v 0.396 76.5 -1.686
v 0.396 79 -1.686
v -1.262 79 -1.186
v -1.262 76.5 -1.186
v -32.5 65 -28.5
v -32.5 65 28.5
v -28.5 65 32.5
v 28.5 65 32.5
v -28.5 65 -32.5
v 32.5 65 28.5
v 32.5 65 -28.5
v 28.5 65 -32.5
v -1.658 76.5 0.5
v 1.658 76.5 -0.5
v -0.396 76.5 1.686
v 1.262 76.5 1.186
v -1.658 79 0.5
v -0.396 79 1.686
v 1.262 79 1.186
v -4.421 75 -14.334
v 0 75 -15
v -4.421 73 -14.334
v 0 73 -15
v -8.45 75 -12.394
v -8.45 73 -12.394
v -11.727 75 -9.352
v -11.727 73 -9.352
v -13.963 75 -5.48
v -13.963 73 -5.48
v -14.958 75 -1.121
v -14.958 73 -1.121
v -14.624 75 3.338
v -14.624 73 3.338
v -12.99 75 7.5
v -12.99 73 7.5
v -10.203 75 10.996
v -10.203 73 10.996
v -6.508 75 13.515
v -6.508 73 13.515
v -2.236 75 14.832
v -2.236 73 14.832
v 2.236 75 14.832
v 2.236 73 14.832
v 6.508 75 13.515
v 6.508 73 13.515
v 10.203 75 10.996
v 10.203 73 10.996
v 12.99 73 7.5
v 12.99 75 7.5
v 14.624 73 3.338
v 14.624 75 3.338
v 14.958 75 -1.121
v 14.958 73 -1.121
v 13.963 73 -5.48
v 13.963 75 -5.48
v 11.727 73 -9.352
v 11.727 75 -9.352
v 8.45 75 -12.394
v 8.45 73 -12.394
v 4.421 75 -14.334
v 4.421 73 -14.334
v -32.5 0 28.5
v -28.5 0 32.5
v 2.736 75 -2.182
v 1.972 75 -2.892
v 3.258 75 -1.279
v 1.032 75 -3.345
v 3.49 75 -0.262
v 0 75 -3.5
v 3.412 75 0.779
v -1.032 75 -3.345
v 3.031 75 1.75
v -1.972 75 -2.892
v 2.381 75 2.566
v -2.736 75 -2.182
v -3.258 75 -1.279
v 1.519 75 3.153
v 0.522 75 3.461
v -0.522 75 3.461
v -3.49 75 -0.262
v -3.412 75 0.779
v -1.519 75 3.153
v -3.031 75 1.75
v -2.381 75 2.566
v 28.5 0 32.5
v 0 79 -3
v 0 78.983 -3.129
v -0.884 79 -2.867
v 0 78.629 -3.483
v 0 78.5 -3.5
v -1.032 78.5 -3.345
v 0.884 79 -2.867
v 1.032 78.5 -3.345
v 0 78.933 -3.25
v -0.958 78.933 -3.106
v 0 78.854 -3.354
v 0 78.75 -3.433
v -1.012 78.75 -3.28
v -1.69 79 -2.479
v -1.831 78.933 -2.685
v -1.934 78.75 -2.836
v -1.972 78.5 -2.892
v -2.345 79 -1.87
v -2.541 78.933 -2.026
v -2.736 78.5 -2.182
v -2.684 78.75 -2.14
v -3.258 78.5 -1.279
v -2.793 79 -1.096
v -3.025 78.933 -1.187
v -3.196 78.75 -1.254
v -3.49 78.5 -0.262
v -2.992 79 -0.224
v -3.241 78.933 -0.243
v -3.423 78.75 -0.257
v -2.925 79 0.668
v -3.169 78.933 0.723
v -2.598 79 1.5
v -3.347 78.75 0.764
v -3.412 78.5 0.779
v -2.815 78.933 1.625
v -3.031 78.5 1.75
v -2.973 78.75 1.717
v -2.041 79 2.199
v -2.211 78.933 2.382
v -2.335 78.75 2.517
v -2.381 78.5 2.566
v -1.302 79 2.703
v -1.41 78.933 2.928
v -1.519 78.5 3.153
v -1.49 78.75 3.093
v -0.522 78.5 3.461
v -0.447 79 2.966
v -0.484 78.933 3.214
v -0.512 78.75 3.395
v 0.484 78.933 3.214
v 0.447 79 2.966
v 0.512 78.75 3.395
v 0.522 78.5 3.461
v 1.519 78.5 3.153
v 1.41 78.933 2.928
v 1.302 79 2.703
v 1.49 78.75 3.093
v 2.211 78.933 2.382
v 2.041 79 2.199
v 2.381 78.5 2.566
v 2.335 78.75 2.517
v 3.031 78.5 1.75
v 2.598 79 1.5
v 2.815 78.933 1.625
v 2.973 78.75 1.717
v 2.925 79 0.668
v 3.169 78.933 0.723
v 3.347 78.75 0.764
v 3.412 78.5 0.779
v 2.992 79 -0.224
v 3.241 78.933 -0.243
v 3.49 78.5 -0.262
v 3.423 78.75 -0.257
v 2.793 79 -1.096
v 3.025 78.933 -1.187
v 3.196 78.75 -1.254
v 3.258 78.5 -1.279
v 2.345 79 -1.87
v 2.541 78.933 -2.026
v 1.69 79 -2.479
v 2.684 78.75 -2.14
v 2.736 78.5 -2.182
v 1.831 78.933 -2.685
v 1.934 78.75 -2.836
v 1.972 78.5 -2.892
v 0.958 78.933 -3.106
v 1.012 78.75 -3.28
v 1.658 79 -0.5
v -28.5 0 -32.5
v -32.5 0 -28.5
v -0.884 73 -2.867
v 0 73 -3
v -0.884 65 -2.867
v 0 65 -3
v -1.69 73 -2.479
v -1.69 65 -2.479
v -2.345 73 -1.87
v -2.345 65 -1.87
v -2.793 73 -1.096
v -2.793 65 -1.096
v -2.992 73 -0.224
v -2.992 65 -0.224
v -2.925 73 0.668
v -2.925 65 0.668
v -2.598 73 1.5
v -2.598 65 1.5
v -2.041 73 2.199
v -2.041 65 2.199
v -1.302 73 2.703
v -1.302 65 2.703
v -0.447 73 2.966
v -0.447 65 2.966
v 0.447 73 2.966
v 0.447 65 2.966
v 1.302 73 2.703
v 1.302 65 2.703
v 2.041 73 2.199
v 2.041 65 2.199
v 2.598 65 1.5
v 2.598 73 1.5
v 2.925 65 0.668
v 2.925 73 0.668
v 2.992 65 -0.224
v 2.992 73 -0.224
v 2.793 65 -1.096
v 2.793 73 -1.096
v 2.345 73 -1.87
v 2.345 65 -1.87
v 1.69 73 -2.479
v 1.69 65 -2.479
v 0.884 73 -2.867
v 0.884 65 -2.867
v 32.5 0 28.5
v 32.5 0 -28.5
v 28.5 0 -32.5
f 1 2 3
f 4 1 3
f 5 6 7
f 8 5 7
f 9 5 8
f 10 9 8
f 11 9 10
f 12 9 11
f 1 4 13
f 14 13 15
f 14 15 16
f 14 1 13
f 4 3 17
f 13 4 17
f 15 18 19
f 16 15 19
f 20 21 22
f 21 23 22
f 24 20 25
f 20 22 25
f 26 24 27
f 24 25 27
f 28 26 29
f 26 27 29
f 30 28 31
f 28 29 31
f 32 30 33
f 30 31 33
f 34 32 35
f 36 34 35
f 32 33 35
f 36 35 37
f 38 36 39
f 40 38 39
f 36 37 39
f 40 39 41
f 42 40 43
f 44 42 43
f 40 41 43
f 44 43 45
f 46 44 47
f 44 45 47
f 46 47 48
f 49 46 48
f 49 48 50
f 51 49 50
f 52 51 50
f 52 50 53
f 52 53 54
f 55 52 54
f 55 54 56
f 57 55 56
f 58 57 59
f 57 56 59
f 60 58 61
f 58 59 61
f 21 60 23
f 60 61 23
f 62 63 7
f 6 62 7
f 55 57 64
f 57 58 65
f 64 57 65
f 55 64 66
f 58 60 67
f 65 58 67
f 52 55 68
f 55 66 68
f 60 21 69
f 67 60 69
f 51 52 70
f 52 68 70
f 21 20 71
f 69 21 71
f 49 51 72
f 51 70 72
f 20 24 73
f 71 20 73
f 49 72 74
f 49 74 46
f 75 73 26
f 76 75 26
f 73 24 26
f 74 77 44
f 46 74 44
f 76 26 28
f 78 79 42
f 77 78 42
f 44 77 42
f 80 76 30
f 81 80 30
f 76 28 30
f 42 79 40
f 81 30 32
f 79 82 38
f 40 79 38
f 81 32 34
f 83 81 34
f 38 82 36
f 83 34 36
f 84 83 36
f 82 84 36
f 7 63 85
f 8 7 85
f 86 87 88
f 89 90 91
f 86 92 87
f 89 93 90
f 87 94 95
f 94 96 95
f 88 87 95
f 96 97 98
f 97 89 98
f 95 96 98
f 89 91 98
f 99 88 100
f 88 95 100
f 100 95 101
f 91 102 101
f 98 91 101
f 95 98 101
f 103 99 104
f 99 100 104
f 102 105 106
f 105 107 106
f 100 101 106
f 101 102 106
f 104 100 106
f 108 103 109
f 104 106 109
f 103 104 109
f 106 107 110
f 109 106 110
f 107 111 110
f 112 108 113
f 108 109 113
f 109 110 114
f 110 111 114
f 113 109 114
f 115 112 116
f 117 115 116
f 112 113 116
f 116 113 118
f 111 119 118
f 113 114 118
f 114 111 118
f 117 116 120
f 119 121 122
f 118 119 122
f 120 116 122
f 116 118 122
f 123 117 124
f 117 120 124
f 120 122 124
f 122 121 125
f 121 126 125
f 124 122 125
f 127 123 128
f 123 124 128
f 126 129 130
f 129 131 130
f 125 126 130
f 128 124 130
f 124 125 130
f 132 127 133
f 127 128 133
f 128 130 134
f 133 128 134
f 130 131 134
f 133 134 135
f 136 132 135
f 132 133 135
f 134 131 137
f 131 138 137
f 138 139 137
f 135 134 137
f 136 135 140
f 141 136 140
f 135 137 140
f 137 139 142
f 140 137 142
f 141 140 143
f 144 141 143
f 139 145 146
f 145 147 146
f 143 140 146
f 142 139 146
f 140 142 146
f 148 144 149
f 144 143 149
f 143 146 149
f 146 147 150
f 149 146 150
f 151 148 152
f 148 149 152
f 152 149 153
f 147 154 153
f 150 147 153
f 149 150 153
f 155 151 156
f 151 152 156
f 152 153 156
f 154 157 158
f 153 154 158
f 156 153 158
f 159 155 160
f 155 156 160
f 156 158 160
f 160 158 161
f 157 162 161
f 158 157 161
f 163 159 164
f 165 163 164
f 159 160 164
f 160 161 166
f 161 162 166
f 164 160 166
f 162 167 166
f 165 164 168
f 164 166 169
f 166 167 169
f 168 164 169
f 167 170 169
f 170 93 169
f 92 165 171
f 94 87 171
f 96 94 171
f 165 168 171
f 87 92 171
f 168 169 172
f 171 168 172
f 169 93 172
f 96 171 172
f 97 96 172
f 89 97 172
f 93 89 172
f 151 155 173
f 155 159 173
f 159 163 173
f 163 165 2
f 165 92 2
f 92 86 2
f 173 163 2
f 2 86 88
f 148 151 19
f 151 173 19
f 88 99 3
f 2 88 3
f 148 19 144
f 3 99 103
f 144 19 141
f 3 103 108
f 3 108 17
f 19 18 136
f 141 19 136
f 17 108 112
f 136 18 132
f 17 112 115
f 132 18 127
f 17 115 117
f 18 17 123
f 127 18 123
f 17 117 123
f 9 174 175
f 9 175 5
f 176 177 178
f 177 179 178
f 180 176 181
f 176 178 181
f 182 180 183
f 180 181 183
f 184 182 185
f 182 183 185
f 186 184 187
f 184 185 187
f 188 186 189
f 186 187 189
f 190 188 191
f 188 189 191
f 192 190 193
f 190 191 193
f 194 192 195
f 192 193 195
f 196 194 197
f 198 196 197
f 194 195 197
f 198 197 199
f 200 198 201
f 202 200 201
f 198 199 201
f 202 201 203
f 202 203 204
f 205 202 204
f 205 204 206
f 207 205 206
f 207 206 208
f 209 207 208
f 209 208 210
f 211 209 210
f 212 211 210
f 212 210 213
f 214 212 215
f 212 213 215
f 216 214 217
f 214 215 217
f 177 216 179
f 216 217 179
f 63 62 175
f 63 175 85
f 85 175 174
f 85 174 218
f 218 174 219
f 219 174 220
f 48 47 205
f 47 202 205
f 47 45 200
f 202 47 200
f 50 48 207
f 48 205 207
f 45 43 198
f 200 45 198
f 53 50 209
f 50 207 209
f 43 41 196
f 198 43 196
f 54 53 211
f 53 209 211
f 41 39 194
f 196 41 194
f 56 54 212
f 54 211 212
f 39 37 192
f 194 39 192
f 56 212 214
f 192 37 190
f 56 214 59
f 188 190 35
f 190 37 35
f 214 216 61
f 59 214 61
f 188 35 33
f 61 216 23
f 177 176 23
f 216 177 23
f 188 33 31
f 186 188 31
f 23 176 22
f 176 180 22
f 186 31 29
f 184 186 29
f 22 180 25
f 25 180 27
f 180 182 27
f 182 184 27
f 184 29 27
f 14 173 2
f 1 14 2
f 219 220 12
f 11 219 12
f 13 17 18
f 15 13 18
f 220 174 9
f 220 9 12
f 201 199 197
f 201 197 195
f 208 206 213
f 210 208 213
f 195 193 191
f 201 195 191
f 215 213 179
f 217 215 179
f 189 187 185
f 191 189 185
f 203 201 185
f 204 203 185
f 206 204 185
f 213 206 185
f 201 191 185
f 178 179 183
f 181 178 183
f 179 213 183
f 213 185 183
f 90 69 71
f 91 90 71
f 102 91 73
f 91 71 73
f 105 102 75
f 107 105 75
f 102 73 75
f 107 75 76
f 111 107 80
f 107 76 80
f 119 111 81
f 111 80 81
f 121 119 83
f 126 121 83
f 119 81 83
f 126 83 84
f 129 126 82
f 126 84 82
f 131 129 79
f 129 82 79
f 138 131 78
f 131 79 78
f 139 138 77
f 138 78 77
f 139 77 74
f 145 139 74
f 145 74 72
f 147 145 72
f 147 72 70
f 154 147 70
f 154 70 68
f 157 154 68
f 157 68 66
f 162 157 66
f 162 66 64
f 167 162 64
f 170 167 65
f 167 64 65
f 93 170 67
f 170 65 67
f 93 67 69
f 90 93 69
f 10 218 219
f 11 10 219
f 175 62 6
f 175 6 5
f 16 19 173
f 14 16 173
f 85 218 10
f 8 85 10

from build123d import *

# Parameters (mm, degrees)
ESQUISSE3_W             = 65
ESQUISSE3_H             = 65
BOSS_EXTRU_3_DEPTH      = 65
CHANFREIN1_SIZE         = 4
ENL_V_MAT_EXTRU_1_DEPTH = 2.5
CONG_1_R                = 0.5


with BuildPart() as part:
    # Esquisse3 → Boss.-Extru.3 (new body)
    with BuildSketch(Plane(origin=(0, 0, 0), x_dir=(1, 0, 0), z_dir=(0, 1, 0))):
        Rectangle(ESQUISSE3_W, ESQUISSE3_H)
    extrude(amount=BOSS_EXTRU_3_DEPTH)

    # Chanfrein1
    chanfrein1_edges = [part.edges().sort_by_distance(p)[0] for p in [
        (32.5, 32.5, 32.5),
        (-32.5, 32.5, 32.5),
        (-32.5, 32.5, -32.5),
        (32.5, 32.5, -32.5),
    ]]
    chamfer(chanfrein1_edges, length=CHANFREIN1_SIZE)


with BuildPart() as body_2:
    # Esquisse4 → Révolution1 (revolve)
    with BuildSketch(Plane.XY, mode=Mode.PRIVATE) as r_volution1_sk:
        Polygon((0, 65), (0, 79), (3.5, 79), (3.5, 75), (15, 75), (15, 73), (3, 73), (3, 65), align=None)
    revolve(r_volution1_sk.sketch.rotate(Axis((0, 79, 0), (0, 1, 0)), 90), axis=Axis((0, 79, 0), (0, 1, 0)))

    # Esquisse5 → Enlèv. mat.-Extru.1 (cut)
    with BuildSketch(Plane(origin=(0, 79, 0), x_dir=(1, 0, 0), z_dir=(0, 1, 0))):
        Polygon((1.262020142, -1.186298934), (1.658375084, 0.499792036), (0.396354942, 1.68609097), (-1.262020142, 1.186298934), (-1.658375084, -0.499792036), (-0.396354942, -1.68609097), align=None)
    extrude(amount=-ENL_V_MAT_EXTRU_1_DEPTH, mode=Mode.SUBTRACT)

    # Congé1
    cong_1_edges = [body_2.edges().sort_by_distance(p)[0] for p in [
        (0, 79, 3.5),
    ]]
    fillet(cong_1_edges, radius=CONG_1_R)


solid = Compound([part.part, body_2.part])
